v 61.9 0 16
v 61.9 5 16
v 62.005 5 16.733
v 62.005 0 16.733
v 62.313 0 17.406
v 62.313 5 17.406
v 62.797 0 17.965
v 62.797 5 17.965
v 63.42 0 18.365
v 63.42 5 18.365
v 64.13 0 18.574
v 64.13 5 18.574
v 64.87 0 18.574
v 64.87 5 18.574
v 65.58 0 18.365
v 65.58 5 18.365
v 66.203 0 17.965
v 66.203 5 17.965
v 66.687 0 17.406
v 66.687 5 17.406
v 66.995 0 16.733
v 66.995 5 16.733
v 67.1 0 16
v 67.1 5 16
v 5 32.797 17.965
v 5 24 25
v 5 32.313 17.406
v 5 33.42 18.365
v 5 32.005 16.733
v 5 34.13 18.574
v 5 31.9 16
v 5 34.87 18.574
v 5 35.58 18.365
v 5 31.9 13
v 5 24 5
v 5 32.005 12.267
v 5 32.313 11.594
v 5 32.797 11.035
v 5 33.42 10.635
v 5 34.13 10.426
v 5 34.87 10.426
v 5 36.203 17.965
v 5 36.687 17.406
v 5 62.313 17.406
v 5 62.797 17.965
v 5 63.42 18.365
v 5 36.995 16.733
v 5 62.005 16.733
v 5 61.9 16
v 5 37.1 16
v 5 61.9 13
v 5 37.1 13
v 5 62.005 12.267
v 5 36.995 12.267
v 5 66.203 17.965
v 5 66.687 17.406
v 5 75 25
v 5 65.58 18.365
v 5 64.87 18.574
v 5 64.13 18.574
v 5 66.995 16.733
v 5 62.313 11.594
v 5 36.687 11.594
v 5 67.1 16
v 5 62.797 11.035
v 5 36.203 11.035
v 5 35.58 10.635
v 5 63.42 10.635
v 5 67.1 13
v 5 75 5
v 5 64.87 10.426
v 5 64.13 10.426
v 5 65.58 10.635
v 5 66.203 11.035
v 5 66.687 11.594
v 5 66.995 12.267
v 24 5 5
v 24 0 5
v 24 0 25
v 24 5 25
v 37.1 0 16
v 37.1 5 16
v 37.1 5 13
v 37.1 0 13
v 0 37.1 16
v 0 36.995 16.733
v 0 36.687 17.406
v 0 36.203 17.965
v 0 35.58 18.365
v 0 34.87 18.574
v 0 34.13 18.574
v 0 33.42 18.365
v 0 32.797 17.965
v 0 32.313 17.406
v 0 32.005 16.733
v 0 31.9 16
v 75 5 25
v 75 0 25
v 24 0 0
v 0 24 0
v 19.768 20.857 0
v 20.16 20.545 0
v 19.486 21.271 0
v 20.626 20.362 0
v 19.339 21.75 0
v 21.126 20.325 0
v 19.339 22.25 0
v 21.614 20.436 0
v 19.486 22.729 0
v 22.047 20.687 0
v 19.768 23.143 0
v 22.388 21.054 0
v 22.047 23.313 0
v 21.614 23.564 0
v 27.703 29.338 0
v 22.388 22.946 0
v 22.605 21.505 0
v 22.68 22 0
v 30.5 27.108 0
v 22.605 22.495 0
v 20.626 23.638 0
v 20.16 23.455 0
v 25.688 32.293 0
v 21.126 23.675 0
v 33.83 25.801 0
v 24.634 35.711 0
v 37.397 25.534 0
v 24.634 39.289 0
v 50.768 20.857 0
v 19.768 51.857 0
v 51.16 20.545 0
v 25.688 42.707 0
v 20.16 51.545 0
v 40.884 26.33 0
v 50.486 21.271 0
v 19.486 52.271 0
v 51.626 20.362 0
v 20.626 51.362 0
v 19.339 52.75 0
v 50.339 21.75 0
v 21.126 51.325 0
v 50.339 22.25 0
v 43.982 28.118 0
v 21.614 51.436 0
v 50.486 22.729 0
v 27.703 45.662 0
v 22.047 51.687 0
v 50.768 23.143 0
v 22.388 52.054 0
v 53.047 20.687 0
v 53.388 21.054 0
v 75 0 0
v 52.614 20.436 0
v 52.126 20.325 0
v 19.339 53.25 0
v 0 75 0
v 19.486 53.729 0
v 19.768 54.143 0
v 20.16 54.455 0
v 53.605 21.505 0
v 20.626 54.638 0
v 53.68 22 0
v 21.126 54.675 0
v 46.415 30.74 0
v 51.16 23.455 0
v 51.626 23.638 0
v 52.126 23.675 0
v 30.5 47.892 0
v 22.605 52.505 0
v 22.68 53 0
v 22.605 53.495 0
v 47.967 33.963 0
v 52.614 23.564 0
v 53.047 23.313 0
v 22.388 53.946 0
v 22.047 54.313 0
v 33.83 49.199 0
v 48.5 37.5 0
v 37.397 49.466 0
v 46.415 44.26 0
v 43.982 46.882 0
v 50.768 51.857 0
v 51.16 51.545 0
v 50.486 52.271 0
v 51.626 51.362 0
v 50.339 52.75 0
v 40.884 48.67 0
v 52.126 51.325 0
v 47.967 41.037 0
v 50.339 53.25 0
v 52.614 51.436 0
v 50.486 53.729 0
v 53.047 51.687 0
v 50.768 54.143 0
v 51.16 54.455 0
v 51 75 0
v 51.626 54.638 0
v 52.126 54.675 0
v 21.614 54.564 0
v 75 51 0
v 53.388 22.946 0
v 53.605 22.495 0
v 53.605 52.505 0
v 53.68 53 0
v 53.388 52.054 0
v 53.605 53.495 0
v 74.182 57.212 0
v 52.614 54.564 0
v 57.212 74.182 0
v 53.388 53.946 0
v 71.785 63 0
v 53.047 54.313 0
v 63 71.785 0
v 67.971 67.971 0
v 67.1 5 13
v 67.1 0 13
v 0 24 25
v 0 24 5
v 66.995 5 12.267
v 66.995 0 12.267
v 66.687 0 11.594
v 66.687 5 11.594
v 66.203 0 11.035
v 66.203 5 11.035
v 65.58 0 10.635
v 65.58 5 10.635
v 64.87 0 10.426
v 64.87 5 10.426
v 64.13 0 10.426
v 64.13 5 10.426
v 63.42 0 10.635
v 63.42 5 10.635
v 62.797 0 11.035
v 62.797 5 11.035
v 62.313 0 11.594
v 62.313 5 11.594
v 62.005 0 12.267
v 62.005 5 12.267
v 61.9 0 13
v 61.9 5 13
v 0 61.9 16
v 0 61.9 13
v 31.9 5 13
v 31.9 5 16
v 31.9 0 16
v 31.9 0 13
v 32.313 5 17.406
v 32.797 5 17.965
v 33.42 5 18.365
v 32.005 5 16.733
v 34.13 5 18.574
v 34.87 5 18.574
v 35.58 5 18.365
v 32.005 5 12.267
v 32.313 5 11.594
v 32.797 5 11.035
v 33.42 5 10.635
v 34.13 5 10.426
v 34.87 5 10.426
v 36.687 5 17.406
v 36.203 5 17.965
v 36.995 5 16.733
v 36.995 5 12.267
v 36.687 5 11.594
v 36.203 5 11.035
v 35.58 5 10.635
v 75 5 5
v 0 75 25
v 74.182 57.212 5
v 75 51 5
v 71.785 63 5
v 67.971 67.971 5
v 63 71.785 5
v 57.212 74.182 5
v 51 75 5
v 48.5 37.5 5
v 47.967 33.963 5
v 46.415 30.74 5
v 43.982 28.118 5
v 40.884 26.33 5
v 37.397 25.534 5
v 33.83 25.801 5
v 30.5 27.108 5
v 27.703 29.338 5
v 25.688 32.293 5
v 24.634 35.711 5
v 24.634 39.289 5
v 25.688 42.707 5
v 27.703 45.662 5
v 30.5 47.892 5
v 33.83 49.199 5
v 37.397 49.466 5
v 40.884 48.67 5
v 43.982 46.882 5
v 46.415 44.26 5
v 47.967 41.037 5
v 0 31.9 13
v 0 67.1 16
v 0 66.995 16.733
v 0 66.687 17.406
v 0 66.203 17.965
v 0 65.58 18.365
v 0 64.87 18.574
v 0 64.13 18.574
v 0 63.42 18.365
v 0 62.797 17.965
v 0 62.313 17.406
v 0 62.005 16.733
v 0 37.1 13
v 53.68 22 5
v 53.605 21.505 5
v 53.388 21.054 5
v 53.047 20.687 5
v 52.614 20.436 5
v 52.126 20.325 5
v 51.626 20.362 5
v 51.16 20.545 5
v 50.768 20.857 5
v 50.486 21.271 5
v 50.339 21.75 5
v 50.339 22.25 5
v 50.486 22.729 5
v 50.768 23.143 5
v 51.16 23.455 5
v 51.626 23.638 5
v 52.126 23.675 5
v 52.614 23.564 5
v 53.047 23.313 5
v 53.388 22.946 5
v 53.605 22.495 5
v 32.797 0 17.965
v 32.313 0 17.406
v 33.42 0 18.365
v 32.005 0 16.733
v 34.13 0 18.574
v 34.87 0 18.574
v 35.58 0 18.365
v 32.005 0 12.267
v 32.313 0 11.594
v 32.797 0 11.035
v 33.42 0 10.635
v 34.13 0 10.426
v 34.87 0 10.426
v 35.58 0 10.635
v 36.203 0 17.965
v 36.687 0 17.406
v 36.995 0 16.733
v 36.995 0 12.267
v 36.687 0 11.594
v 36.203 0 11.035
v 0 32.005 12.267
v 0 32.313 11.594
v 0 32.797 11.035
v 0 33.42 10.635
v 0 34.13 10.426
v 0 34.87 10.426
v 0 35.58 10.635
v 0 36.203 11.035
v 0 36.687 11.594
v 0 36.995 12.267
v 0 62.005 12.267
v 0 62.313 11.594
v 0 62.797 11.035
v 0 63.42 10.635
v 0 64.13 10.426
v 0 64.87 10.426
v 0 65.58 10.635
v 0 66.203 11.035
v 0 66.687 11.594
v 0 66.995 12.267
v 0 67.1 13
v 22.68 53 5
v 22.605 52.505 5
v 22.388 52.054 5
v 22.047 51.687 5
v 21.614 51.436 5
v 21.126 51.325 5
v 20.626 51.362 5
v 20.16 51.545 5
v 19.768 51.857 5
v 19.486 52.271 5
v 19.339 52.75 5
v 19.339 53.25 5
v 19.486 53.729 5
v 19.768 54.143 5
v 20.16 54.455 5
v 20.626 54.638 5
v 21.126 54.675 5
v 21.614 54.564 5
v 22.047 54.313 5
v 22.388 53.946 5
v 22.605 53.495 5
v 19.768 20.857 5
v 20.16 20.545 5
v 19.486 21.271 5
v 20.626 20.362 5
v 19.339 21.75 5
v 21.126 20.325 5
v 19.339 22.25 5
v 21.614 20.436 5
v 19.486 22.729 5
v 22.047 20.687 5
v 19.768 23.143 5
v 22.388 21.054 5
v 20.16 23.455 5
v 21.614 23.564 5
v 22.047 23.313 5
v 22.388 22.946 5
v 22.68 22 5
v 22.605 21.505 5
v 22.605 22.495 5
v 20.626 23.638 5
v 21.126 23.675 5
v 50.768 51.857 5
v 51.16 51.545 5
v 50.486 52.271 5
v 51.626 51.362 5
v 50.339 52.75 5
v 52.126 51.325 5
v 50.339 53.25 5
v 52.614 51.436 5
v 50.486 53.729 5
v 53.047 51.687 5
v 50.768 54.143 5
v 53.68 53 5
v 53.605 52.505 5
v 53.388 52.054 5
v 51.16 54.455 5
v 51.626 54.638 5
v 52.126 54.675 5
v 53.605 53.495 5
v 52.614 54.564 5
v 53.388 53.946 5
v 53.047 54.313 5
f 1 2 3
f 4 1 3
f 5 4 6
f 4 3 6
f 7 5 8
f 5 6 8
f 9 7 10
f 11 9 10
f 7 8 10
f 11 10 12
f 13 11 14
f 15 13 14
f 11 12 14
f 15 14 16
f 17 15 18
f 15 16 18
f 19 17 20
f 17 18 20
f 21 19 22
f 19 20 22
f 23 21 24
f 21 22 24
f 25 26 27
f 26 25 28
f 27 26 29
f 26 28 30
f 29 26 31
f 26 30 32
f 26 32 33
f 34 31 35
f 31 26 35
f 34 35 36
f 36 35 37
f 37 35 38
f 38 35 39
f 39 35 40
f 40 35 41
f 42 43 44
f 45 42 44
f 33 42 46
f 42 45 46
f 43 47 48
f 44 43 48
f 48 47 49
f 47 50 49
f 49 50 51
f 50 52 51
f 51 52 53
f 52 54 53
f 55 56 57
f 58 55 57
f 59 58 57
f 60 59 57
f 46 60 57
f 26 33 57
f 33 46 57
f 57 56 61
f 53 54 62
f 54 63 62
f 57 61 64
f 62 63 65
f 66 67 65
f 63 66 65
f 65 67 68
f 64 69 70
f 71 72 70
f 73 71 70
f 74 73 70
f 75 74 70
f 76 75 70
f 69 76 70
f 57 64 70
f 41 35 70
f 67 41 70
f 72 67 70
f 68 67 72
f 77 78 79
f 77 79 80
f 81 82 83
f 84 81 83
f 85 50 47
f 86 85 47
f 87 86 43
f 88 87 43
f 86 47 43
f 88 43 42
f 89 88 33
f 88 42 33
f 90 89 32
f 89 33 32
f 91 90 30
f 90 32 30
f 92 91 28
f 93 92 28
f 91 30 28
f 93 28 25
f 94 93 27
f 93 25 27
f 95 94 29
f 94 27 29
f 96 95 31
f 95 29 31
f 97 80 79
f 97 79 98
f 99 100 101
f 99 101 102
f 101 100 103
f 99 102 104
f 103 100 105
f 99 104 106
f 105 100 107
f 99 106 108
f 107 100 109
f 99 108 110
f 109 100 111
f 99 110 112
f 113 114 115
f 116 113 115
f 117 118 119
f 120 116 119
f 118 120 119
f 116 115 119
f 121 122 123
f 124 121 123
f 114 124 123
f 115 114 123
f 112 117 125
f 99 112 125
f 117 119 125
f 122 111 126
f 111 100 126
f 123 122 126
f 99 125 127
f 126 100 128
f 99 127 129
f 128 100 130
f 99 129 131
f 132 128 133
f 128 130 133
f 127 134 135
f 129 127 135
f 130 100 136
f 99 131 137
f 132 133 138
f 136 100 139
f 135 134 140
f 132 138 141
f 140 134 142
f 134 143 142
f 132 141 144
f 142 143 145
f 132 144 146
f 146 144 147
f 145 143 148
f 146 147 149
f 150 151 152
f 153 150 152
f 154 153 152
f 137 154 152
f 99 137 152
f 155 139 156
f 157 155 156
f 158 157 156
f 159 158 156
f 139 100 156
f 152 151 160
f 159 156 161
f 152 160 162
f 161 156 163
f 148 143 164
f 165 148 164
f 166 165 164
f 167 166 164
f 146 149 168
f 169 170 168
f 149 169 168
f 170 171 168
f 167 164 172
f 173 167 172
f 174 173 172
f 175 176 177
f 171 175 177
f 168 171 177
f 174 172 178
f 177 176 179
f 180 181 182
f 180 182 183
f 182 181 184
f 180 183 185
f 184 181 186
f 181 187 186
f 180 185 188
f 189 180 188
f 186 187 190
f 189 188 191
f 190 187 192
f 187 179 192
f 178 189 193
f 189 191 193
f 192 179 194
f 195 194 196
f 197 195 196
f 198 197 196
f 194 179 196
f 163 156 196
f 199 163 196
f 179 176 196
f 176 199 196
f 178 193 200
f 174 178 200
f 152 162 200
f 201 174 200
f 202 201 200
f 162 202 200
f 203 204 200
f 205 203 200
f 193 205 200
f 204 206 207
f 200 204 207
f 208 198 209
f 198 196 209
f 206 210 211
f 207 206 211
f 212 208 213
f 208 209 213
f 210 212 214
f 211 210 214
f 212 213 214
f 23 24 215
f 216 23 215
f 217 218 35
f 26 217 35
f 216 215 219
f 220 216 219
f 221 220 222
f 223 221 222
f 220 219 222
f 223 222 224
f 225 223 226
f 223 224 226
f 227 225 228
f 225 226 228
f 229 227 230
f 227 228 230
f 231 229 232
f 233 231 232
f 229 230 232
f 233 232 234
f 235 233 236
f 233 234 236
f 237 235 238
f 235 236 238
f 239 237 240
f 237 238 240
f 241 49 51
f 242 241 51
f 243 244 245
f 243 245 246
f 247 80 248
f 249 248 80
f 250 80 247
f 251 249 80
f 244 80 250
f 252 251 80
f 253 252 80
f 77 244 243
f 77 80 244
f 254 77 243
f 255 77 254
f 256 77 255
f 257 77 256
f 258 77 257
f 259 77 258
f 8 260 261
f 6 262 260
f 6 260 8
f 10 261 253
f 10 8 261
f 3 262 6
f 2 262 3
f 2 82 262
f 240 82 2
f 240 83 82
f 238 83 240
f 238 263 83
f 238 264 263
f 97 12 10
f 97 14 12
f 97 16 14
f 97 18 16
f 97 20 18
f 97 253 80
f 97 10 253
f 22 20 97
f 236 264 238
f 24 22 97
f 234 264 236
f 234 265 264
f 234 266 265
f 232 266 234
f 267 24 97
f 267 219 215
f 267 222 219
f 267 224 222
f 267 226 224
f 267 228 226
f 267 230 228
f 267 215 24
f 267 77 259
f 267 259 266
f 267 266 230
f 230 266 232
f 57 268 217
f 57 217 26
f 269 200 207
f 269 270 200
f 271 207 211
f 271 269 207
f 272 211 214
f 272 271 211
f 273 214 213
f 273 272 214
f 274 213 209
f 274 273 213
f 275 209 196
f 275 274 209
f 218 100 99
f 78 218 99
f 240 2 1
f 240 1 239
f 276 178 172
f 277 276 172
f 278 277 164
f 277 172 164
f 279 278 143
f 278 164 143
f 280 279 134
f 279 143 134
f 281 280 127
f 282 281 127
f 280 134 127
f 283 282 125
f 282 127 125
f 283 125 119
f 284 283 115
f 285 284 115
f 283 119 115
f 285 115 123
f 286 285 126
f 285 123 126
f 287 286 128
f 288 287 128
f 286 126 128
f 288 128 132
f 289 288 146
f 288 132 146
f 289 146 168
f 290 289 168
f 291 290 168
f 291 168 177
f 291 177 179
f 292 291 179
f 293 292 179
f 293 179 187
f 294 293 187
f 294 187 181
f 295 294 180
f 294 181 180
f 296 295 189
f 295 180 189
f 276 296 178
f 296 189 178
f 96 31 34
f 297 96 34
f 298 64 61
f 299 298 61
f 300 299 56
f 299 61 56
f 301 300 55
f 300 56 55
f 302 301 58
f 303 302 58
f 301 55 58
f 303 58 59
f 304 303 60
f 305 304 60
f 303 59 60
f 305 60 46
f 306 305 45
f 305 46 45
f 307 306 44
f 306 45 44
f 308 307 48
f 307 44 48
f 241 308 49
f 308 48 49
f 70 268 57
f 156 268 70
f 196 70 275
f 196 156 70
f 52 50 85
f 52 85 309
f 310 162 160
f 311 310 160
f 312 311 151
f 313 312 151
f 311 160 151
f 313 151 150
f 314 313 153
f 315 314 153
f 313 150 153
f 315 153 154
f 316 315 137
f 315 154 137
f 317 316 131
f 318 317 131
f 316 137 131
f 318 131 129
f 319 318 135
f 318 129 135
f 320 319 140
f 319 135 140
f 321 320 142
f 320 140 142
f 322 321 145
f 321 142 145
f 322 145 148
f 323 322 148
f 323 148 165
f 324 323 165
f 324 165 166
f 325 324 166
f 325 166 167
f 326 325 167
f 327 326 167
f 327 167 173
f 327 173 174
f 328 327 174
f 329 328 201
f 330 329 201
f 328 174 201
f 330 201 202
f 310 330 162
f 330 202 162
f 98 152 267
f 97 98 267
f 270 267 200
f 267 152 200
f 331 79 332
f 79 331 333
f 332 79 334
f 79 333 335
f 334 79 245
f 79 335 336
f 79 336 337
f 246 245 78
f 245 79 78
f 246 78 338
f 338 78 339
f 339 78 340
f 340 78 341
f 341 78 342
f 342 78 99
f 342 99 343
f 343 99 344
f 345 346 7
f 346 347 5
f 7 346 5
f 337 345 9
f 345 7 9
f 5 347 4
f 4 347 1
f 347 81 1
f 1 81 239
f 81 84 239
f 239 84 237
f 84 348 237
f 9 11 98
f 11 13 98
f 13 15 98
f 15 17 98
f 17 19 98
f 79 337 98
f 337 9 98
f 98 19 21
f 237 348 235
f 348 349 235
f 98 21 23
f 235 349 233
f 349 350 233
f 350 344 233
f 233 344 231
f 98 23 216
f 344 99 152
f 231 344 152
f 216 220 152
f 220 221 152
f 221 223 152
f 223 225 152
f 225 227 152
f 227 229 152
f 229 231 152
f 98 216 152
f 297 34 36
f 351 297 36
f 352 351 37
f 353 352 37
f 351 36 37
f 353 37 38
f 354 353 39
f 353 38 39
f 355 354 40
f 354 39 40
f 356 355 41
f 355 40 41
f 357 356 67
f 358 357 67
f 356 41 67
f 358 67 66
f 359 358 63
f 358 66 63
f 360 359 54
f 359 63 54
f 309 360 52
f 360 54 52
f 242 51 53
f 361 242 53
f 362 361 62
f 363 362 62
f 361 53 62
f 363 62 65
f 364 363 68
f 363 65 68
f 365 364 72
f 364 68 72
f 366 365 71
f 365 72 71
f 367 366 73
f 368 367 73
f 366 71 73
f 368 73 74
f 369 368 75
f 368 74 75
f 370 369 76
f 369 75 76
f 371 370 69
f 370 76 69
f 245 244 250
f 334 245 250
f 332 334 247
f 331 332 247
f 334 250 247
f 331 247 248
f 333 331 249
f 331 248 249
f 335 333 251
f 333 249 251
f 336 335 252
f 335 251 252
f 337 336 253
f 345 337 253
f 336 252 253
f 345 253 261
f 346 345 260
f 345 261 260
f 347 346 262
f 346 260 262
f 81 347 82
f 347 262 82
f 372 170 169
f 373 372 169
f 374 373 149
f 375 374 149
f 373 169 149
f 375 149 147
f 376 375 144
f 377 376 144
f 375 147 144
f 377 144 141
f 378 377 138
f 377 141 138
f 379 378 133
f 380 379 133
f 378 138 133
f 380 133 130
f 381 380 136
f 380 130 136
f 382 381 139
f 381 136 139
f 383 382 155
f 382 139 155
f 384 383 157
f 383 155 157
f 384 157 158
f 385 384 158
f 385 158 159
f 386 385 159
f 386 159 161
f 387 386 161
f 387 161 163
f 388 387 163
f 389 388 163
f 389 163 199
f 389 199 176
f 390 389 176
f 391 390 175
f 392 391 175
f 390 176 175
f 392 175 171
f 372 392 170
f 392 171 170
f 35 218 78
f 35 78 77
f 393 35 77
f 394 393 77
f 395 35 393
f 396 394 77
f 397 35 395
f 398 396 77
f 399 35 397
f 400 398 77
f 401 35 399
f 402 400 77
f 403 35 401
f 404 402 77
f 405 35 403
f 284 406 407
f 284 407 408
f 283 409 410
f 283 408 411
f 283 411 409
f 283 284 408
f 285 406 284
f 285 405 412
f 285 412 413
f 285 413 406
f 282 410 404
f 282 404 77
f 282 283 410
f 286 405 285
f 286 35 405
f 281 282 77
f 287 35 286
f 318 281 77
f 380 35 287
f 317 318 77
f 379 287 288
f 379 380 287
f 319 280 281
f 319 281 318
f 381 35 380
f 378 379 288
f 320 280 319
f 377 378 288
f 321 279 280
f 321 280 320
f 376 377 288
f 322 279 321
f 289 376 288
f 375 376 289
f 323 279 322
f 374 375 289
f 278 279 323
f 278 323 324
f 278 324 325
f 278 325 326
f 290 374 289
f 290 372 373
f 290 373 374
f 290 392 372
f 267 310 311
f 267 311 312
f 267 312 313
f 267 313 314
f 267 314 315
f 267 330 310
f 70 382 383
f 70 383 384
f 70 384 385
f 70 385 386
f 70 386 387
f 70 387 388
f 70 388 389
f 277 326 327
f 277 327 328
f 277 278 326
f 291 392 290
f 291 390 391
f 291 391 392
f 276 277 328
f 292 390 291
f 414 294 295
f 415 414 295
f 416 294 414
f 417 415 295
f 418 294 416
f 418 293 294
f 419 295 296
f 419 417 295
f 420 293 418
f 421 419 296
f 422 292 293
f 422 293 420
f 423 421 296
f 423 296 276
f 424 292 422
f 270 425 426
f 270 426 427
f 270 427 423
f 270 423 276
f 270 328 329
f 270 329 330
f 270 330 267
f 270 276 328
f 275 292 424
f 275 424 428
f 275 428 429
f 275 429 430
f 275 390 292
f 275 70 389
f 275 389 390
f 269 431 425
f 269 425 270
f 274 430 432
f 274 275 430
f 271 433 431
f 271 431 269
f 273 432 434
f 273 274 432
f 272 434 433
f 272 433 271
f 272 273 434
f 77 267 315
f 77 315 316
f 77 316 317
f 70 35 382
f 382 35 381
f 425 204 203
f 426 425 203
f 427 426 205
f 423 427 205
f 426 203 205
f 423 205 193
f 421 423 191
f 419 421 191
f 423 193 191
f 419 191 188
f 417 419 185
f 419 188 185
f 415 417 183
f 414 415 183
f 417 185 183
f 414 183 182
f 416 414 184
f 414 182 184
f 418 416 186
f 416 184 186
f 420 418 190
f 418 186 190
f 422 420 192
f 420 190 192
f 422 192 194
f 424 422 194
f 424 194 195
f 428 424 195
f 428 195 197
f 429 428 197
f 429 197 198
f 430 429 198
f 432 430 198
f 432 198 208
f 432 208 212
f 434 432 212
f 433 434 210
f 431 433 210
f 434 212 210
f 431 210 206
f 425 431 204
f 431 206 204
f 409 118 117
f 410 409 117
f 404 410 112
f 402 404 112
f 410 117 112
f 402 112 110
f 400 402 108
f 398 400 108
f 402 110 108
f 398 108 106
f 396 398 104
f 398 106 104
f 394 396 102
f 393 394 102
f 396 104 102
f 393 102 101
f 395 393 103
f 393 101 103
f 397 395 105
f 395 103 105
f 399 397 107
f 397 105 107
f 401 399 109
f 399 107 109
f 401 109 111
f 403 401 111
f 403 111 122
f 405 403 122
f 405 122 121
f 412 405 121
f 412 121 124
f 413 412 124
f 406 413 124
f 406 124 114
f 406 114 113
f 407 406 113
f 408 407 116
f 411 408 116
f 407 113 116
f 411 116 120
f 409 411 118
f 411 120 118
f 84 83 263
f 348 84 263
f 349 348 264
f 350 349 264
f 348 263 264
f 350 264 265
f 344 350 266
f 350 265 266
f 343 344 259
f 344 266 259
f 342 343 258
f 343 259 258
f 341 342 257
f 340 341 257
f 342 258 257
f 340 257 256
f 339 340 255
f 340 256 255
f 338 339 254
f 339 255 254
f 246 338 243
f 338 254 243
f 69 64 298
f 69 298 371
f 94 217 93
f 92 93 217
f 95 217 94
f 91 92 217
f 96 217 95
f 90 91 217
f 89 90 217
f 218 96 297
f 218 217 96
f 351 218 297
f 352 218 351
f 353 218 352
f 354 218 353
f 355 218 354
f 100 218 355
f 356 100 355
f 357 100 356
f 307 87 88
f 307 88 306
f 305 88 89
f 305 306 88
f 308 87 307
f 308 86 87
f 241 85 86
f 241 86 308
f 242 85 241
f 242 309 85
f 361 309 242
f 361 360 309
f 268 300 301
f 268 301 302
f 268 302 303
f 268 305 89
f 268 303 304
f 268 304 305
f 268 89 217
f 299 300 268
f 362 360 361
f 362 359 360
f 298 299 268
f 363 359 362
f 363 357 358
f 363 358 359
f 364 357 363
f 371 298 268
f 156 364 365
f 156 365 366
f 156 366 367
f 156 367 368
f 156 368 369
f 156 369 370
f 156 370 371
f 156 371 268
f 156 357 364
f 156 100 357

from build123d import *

# Parameters (mm, degrees)
PAD_DEPTH       = 5
SKETCH002_R     = 1.68
SKETCH002_R_2   = 12
POCKET_DEPTH    = 5
FILLET_R        = 24
SKETCH_W        = 5
SKETCH_H        = 51
SKETCH_W_2      = 51
SKETCH_H_2      = 5
PAD001_DEPTH    = 20
POCKET001_DEPTH = 5
POCKET002_DEPTH = 5


with BuildPart() as part:
    # Sketch001 → Pad (new body)
    with BuildSketch(Plane.XY):
        Polygon((75, 0), (75, 75), (0, 75), (0, 24), (24, 0), align=None)
    extrude(amount=PAD_DEPTH)

    # Sketch002 → Pocket (cut)
    with BuildSketch(Plane(origin=(0, 0, 0), x_dir=(1, 0, 0), z_dir=(0, 0, -1))):
        with Locations((21, -22)):
            Circle(SKETCH002_R)
        with Locations((52, -22)):
            Circle(SKETCH002_R)
        with Locations((52, -53)):
            Circle(SKETCH002_R)
        with Locations((21, -53)):
            Circle(SKETCH002_R)
        with Locations((36.5, -37.5)):
            Circle(SKETCH002_R_2)
    extrude(amount=-POCKET_DEPTH, mode=Mode.SUBTRACT)

    # Fillet
    fillet_edges = [part.edges().sort_by_distance(p)[0] for p in [
        (75, 75, 2.5),
    ]]
    fillet(fillet_edges, radius=FILLET_R)

    # Sketch → Pad001 (new body)
    with BuildSketch(Plane.XY.offset(5)):
        with Locations((2.5, 49.5)):
            Rectangle(SKETCH_W, SKETCH_H)
        with Locations((49.5, 2.5)):
            Rectangle(SKETCH_W_2, SKETCH_H_2)
    extrude(amount=PAD001_DEPTH)

    # Sketch004 → Pocket001 (cut)
    with BuildSketch(Plane.YZ.offset(5)):
        with BuildLine():
            ThreePointArc((67.1, 16), (64.5, 18.6), (61.9, 16))
            Line((61.9, 16), (61.9, 13))
            ThreePointArc((61.9, 13), (64.5, 10.4), (67.1, 13))
            Line((67.1, 16), (67.1, 13))
        make_face()
        with BuildLine():
            ThreePointArc((37.1, 16), (34.5, 18.6), (31.9, 16))
            Line((31.9, 16), (31.9, 13))
            ThreePointArc((31.9, 13), (34.5, 10.4), (37.1, 13))
            Line((37.1, 16), (37.1, 13))
        make_face()
    extrude(amount=-POCKET001_DEPTH, mode=Mode.SUBTRACT)

    # Sketch003 → Pocket002 (cut)
    with BuildSketch(Plane(origin=(0, 5, 0), x_dir=(-1, 0, 0), z_dir=(0, 1, 0))):
        with BuildLine():
            ThreePointArc((-61.9, 16), (-64.5, 18.6), (-67.1, 16))
            Line((-67.1, 16), (-67.1, 13))
            ThreePointArc((-67.1, 13), (-64.5, 10.4), (-61.9, 13))
            Line((-61.9, 16), (-61.9, 13))
        make_face()
        with BuildLine():
            Line((-31.9, 16), (-31.9, 13))
            ThreePointArc((-37.1, 13), (-34.5, 10.4), (-31.9, 13))
            Line((-37.1, 16), (-37.1, 13))
            ThreePointArc((-31.9, 16), (-34.5, 18.6), (-37.1, 16))
        make_face()
    extrude(amount=-POCKET002_DEPTH, mode=Mode.SUBTRACT)


solid = part.part
